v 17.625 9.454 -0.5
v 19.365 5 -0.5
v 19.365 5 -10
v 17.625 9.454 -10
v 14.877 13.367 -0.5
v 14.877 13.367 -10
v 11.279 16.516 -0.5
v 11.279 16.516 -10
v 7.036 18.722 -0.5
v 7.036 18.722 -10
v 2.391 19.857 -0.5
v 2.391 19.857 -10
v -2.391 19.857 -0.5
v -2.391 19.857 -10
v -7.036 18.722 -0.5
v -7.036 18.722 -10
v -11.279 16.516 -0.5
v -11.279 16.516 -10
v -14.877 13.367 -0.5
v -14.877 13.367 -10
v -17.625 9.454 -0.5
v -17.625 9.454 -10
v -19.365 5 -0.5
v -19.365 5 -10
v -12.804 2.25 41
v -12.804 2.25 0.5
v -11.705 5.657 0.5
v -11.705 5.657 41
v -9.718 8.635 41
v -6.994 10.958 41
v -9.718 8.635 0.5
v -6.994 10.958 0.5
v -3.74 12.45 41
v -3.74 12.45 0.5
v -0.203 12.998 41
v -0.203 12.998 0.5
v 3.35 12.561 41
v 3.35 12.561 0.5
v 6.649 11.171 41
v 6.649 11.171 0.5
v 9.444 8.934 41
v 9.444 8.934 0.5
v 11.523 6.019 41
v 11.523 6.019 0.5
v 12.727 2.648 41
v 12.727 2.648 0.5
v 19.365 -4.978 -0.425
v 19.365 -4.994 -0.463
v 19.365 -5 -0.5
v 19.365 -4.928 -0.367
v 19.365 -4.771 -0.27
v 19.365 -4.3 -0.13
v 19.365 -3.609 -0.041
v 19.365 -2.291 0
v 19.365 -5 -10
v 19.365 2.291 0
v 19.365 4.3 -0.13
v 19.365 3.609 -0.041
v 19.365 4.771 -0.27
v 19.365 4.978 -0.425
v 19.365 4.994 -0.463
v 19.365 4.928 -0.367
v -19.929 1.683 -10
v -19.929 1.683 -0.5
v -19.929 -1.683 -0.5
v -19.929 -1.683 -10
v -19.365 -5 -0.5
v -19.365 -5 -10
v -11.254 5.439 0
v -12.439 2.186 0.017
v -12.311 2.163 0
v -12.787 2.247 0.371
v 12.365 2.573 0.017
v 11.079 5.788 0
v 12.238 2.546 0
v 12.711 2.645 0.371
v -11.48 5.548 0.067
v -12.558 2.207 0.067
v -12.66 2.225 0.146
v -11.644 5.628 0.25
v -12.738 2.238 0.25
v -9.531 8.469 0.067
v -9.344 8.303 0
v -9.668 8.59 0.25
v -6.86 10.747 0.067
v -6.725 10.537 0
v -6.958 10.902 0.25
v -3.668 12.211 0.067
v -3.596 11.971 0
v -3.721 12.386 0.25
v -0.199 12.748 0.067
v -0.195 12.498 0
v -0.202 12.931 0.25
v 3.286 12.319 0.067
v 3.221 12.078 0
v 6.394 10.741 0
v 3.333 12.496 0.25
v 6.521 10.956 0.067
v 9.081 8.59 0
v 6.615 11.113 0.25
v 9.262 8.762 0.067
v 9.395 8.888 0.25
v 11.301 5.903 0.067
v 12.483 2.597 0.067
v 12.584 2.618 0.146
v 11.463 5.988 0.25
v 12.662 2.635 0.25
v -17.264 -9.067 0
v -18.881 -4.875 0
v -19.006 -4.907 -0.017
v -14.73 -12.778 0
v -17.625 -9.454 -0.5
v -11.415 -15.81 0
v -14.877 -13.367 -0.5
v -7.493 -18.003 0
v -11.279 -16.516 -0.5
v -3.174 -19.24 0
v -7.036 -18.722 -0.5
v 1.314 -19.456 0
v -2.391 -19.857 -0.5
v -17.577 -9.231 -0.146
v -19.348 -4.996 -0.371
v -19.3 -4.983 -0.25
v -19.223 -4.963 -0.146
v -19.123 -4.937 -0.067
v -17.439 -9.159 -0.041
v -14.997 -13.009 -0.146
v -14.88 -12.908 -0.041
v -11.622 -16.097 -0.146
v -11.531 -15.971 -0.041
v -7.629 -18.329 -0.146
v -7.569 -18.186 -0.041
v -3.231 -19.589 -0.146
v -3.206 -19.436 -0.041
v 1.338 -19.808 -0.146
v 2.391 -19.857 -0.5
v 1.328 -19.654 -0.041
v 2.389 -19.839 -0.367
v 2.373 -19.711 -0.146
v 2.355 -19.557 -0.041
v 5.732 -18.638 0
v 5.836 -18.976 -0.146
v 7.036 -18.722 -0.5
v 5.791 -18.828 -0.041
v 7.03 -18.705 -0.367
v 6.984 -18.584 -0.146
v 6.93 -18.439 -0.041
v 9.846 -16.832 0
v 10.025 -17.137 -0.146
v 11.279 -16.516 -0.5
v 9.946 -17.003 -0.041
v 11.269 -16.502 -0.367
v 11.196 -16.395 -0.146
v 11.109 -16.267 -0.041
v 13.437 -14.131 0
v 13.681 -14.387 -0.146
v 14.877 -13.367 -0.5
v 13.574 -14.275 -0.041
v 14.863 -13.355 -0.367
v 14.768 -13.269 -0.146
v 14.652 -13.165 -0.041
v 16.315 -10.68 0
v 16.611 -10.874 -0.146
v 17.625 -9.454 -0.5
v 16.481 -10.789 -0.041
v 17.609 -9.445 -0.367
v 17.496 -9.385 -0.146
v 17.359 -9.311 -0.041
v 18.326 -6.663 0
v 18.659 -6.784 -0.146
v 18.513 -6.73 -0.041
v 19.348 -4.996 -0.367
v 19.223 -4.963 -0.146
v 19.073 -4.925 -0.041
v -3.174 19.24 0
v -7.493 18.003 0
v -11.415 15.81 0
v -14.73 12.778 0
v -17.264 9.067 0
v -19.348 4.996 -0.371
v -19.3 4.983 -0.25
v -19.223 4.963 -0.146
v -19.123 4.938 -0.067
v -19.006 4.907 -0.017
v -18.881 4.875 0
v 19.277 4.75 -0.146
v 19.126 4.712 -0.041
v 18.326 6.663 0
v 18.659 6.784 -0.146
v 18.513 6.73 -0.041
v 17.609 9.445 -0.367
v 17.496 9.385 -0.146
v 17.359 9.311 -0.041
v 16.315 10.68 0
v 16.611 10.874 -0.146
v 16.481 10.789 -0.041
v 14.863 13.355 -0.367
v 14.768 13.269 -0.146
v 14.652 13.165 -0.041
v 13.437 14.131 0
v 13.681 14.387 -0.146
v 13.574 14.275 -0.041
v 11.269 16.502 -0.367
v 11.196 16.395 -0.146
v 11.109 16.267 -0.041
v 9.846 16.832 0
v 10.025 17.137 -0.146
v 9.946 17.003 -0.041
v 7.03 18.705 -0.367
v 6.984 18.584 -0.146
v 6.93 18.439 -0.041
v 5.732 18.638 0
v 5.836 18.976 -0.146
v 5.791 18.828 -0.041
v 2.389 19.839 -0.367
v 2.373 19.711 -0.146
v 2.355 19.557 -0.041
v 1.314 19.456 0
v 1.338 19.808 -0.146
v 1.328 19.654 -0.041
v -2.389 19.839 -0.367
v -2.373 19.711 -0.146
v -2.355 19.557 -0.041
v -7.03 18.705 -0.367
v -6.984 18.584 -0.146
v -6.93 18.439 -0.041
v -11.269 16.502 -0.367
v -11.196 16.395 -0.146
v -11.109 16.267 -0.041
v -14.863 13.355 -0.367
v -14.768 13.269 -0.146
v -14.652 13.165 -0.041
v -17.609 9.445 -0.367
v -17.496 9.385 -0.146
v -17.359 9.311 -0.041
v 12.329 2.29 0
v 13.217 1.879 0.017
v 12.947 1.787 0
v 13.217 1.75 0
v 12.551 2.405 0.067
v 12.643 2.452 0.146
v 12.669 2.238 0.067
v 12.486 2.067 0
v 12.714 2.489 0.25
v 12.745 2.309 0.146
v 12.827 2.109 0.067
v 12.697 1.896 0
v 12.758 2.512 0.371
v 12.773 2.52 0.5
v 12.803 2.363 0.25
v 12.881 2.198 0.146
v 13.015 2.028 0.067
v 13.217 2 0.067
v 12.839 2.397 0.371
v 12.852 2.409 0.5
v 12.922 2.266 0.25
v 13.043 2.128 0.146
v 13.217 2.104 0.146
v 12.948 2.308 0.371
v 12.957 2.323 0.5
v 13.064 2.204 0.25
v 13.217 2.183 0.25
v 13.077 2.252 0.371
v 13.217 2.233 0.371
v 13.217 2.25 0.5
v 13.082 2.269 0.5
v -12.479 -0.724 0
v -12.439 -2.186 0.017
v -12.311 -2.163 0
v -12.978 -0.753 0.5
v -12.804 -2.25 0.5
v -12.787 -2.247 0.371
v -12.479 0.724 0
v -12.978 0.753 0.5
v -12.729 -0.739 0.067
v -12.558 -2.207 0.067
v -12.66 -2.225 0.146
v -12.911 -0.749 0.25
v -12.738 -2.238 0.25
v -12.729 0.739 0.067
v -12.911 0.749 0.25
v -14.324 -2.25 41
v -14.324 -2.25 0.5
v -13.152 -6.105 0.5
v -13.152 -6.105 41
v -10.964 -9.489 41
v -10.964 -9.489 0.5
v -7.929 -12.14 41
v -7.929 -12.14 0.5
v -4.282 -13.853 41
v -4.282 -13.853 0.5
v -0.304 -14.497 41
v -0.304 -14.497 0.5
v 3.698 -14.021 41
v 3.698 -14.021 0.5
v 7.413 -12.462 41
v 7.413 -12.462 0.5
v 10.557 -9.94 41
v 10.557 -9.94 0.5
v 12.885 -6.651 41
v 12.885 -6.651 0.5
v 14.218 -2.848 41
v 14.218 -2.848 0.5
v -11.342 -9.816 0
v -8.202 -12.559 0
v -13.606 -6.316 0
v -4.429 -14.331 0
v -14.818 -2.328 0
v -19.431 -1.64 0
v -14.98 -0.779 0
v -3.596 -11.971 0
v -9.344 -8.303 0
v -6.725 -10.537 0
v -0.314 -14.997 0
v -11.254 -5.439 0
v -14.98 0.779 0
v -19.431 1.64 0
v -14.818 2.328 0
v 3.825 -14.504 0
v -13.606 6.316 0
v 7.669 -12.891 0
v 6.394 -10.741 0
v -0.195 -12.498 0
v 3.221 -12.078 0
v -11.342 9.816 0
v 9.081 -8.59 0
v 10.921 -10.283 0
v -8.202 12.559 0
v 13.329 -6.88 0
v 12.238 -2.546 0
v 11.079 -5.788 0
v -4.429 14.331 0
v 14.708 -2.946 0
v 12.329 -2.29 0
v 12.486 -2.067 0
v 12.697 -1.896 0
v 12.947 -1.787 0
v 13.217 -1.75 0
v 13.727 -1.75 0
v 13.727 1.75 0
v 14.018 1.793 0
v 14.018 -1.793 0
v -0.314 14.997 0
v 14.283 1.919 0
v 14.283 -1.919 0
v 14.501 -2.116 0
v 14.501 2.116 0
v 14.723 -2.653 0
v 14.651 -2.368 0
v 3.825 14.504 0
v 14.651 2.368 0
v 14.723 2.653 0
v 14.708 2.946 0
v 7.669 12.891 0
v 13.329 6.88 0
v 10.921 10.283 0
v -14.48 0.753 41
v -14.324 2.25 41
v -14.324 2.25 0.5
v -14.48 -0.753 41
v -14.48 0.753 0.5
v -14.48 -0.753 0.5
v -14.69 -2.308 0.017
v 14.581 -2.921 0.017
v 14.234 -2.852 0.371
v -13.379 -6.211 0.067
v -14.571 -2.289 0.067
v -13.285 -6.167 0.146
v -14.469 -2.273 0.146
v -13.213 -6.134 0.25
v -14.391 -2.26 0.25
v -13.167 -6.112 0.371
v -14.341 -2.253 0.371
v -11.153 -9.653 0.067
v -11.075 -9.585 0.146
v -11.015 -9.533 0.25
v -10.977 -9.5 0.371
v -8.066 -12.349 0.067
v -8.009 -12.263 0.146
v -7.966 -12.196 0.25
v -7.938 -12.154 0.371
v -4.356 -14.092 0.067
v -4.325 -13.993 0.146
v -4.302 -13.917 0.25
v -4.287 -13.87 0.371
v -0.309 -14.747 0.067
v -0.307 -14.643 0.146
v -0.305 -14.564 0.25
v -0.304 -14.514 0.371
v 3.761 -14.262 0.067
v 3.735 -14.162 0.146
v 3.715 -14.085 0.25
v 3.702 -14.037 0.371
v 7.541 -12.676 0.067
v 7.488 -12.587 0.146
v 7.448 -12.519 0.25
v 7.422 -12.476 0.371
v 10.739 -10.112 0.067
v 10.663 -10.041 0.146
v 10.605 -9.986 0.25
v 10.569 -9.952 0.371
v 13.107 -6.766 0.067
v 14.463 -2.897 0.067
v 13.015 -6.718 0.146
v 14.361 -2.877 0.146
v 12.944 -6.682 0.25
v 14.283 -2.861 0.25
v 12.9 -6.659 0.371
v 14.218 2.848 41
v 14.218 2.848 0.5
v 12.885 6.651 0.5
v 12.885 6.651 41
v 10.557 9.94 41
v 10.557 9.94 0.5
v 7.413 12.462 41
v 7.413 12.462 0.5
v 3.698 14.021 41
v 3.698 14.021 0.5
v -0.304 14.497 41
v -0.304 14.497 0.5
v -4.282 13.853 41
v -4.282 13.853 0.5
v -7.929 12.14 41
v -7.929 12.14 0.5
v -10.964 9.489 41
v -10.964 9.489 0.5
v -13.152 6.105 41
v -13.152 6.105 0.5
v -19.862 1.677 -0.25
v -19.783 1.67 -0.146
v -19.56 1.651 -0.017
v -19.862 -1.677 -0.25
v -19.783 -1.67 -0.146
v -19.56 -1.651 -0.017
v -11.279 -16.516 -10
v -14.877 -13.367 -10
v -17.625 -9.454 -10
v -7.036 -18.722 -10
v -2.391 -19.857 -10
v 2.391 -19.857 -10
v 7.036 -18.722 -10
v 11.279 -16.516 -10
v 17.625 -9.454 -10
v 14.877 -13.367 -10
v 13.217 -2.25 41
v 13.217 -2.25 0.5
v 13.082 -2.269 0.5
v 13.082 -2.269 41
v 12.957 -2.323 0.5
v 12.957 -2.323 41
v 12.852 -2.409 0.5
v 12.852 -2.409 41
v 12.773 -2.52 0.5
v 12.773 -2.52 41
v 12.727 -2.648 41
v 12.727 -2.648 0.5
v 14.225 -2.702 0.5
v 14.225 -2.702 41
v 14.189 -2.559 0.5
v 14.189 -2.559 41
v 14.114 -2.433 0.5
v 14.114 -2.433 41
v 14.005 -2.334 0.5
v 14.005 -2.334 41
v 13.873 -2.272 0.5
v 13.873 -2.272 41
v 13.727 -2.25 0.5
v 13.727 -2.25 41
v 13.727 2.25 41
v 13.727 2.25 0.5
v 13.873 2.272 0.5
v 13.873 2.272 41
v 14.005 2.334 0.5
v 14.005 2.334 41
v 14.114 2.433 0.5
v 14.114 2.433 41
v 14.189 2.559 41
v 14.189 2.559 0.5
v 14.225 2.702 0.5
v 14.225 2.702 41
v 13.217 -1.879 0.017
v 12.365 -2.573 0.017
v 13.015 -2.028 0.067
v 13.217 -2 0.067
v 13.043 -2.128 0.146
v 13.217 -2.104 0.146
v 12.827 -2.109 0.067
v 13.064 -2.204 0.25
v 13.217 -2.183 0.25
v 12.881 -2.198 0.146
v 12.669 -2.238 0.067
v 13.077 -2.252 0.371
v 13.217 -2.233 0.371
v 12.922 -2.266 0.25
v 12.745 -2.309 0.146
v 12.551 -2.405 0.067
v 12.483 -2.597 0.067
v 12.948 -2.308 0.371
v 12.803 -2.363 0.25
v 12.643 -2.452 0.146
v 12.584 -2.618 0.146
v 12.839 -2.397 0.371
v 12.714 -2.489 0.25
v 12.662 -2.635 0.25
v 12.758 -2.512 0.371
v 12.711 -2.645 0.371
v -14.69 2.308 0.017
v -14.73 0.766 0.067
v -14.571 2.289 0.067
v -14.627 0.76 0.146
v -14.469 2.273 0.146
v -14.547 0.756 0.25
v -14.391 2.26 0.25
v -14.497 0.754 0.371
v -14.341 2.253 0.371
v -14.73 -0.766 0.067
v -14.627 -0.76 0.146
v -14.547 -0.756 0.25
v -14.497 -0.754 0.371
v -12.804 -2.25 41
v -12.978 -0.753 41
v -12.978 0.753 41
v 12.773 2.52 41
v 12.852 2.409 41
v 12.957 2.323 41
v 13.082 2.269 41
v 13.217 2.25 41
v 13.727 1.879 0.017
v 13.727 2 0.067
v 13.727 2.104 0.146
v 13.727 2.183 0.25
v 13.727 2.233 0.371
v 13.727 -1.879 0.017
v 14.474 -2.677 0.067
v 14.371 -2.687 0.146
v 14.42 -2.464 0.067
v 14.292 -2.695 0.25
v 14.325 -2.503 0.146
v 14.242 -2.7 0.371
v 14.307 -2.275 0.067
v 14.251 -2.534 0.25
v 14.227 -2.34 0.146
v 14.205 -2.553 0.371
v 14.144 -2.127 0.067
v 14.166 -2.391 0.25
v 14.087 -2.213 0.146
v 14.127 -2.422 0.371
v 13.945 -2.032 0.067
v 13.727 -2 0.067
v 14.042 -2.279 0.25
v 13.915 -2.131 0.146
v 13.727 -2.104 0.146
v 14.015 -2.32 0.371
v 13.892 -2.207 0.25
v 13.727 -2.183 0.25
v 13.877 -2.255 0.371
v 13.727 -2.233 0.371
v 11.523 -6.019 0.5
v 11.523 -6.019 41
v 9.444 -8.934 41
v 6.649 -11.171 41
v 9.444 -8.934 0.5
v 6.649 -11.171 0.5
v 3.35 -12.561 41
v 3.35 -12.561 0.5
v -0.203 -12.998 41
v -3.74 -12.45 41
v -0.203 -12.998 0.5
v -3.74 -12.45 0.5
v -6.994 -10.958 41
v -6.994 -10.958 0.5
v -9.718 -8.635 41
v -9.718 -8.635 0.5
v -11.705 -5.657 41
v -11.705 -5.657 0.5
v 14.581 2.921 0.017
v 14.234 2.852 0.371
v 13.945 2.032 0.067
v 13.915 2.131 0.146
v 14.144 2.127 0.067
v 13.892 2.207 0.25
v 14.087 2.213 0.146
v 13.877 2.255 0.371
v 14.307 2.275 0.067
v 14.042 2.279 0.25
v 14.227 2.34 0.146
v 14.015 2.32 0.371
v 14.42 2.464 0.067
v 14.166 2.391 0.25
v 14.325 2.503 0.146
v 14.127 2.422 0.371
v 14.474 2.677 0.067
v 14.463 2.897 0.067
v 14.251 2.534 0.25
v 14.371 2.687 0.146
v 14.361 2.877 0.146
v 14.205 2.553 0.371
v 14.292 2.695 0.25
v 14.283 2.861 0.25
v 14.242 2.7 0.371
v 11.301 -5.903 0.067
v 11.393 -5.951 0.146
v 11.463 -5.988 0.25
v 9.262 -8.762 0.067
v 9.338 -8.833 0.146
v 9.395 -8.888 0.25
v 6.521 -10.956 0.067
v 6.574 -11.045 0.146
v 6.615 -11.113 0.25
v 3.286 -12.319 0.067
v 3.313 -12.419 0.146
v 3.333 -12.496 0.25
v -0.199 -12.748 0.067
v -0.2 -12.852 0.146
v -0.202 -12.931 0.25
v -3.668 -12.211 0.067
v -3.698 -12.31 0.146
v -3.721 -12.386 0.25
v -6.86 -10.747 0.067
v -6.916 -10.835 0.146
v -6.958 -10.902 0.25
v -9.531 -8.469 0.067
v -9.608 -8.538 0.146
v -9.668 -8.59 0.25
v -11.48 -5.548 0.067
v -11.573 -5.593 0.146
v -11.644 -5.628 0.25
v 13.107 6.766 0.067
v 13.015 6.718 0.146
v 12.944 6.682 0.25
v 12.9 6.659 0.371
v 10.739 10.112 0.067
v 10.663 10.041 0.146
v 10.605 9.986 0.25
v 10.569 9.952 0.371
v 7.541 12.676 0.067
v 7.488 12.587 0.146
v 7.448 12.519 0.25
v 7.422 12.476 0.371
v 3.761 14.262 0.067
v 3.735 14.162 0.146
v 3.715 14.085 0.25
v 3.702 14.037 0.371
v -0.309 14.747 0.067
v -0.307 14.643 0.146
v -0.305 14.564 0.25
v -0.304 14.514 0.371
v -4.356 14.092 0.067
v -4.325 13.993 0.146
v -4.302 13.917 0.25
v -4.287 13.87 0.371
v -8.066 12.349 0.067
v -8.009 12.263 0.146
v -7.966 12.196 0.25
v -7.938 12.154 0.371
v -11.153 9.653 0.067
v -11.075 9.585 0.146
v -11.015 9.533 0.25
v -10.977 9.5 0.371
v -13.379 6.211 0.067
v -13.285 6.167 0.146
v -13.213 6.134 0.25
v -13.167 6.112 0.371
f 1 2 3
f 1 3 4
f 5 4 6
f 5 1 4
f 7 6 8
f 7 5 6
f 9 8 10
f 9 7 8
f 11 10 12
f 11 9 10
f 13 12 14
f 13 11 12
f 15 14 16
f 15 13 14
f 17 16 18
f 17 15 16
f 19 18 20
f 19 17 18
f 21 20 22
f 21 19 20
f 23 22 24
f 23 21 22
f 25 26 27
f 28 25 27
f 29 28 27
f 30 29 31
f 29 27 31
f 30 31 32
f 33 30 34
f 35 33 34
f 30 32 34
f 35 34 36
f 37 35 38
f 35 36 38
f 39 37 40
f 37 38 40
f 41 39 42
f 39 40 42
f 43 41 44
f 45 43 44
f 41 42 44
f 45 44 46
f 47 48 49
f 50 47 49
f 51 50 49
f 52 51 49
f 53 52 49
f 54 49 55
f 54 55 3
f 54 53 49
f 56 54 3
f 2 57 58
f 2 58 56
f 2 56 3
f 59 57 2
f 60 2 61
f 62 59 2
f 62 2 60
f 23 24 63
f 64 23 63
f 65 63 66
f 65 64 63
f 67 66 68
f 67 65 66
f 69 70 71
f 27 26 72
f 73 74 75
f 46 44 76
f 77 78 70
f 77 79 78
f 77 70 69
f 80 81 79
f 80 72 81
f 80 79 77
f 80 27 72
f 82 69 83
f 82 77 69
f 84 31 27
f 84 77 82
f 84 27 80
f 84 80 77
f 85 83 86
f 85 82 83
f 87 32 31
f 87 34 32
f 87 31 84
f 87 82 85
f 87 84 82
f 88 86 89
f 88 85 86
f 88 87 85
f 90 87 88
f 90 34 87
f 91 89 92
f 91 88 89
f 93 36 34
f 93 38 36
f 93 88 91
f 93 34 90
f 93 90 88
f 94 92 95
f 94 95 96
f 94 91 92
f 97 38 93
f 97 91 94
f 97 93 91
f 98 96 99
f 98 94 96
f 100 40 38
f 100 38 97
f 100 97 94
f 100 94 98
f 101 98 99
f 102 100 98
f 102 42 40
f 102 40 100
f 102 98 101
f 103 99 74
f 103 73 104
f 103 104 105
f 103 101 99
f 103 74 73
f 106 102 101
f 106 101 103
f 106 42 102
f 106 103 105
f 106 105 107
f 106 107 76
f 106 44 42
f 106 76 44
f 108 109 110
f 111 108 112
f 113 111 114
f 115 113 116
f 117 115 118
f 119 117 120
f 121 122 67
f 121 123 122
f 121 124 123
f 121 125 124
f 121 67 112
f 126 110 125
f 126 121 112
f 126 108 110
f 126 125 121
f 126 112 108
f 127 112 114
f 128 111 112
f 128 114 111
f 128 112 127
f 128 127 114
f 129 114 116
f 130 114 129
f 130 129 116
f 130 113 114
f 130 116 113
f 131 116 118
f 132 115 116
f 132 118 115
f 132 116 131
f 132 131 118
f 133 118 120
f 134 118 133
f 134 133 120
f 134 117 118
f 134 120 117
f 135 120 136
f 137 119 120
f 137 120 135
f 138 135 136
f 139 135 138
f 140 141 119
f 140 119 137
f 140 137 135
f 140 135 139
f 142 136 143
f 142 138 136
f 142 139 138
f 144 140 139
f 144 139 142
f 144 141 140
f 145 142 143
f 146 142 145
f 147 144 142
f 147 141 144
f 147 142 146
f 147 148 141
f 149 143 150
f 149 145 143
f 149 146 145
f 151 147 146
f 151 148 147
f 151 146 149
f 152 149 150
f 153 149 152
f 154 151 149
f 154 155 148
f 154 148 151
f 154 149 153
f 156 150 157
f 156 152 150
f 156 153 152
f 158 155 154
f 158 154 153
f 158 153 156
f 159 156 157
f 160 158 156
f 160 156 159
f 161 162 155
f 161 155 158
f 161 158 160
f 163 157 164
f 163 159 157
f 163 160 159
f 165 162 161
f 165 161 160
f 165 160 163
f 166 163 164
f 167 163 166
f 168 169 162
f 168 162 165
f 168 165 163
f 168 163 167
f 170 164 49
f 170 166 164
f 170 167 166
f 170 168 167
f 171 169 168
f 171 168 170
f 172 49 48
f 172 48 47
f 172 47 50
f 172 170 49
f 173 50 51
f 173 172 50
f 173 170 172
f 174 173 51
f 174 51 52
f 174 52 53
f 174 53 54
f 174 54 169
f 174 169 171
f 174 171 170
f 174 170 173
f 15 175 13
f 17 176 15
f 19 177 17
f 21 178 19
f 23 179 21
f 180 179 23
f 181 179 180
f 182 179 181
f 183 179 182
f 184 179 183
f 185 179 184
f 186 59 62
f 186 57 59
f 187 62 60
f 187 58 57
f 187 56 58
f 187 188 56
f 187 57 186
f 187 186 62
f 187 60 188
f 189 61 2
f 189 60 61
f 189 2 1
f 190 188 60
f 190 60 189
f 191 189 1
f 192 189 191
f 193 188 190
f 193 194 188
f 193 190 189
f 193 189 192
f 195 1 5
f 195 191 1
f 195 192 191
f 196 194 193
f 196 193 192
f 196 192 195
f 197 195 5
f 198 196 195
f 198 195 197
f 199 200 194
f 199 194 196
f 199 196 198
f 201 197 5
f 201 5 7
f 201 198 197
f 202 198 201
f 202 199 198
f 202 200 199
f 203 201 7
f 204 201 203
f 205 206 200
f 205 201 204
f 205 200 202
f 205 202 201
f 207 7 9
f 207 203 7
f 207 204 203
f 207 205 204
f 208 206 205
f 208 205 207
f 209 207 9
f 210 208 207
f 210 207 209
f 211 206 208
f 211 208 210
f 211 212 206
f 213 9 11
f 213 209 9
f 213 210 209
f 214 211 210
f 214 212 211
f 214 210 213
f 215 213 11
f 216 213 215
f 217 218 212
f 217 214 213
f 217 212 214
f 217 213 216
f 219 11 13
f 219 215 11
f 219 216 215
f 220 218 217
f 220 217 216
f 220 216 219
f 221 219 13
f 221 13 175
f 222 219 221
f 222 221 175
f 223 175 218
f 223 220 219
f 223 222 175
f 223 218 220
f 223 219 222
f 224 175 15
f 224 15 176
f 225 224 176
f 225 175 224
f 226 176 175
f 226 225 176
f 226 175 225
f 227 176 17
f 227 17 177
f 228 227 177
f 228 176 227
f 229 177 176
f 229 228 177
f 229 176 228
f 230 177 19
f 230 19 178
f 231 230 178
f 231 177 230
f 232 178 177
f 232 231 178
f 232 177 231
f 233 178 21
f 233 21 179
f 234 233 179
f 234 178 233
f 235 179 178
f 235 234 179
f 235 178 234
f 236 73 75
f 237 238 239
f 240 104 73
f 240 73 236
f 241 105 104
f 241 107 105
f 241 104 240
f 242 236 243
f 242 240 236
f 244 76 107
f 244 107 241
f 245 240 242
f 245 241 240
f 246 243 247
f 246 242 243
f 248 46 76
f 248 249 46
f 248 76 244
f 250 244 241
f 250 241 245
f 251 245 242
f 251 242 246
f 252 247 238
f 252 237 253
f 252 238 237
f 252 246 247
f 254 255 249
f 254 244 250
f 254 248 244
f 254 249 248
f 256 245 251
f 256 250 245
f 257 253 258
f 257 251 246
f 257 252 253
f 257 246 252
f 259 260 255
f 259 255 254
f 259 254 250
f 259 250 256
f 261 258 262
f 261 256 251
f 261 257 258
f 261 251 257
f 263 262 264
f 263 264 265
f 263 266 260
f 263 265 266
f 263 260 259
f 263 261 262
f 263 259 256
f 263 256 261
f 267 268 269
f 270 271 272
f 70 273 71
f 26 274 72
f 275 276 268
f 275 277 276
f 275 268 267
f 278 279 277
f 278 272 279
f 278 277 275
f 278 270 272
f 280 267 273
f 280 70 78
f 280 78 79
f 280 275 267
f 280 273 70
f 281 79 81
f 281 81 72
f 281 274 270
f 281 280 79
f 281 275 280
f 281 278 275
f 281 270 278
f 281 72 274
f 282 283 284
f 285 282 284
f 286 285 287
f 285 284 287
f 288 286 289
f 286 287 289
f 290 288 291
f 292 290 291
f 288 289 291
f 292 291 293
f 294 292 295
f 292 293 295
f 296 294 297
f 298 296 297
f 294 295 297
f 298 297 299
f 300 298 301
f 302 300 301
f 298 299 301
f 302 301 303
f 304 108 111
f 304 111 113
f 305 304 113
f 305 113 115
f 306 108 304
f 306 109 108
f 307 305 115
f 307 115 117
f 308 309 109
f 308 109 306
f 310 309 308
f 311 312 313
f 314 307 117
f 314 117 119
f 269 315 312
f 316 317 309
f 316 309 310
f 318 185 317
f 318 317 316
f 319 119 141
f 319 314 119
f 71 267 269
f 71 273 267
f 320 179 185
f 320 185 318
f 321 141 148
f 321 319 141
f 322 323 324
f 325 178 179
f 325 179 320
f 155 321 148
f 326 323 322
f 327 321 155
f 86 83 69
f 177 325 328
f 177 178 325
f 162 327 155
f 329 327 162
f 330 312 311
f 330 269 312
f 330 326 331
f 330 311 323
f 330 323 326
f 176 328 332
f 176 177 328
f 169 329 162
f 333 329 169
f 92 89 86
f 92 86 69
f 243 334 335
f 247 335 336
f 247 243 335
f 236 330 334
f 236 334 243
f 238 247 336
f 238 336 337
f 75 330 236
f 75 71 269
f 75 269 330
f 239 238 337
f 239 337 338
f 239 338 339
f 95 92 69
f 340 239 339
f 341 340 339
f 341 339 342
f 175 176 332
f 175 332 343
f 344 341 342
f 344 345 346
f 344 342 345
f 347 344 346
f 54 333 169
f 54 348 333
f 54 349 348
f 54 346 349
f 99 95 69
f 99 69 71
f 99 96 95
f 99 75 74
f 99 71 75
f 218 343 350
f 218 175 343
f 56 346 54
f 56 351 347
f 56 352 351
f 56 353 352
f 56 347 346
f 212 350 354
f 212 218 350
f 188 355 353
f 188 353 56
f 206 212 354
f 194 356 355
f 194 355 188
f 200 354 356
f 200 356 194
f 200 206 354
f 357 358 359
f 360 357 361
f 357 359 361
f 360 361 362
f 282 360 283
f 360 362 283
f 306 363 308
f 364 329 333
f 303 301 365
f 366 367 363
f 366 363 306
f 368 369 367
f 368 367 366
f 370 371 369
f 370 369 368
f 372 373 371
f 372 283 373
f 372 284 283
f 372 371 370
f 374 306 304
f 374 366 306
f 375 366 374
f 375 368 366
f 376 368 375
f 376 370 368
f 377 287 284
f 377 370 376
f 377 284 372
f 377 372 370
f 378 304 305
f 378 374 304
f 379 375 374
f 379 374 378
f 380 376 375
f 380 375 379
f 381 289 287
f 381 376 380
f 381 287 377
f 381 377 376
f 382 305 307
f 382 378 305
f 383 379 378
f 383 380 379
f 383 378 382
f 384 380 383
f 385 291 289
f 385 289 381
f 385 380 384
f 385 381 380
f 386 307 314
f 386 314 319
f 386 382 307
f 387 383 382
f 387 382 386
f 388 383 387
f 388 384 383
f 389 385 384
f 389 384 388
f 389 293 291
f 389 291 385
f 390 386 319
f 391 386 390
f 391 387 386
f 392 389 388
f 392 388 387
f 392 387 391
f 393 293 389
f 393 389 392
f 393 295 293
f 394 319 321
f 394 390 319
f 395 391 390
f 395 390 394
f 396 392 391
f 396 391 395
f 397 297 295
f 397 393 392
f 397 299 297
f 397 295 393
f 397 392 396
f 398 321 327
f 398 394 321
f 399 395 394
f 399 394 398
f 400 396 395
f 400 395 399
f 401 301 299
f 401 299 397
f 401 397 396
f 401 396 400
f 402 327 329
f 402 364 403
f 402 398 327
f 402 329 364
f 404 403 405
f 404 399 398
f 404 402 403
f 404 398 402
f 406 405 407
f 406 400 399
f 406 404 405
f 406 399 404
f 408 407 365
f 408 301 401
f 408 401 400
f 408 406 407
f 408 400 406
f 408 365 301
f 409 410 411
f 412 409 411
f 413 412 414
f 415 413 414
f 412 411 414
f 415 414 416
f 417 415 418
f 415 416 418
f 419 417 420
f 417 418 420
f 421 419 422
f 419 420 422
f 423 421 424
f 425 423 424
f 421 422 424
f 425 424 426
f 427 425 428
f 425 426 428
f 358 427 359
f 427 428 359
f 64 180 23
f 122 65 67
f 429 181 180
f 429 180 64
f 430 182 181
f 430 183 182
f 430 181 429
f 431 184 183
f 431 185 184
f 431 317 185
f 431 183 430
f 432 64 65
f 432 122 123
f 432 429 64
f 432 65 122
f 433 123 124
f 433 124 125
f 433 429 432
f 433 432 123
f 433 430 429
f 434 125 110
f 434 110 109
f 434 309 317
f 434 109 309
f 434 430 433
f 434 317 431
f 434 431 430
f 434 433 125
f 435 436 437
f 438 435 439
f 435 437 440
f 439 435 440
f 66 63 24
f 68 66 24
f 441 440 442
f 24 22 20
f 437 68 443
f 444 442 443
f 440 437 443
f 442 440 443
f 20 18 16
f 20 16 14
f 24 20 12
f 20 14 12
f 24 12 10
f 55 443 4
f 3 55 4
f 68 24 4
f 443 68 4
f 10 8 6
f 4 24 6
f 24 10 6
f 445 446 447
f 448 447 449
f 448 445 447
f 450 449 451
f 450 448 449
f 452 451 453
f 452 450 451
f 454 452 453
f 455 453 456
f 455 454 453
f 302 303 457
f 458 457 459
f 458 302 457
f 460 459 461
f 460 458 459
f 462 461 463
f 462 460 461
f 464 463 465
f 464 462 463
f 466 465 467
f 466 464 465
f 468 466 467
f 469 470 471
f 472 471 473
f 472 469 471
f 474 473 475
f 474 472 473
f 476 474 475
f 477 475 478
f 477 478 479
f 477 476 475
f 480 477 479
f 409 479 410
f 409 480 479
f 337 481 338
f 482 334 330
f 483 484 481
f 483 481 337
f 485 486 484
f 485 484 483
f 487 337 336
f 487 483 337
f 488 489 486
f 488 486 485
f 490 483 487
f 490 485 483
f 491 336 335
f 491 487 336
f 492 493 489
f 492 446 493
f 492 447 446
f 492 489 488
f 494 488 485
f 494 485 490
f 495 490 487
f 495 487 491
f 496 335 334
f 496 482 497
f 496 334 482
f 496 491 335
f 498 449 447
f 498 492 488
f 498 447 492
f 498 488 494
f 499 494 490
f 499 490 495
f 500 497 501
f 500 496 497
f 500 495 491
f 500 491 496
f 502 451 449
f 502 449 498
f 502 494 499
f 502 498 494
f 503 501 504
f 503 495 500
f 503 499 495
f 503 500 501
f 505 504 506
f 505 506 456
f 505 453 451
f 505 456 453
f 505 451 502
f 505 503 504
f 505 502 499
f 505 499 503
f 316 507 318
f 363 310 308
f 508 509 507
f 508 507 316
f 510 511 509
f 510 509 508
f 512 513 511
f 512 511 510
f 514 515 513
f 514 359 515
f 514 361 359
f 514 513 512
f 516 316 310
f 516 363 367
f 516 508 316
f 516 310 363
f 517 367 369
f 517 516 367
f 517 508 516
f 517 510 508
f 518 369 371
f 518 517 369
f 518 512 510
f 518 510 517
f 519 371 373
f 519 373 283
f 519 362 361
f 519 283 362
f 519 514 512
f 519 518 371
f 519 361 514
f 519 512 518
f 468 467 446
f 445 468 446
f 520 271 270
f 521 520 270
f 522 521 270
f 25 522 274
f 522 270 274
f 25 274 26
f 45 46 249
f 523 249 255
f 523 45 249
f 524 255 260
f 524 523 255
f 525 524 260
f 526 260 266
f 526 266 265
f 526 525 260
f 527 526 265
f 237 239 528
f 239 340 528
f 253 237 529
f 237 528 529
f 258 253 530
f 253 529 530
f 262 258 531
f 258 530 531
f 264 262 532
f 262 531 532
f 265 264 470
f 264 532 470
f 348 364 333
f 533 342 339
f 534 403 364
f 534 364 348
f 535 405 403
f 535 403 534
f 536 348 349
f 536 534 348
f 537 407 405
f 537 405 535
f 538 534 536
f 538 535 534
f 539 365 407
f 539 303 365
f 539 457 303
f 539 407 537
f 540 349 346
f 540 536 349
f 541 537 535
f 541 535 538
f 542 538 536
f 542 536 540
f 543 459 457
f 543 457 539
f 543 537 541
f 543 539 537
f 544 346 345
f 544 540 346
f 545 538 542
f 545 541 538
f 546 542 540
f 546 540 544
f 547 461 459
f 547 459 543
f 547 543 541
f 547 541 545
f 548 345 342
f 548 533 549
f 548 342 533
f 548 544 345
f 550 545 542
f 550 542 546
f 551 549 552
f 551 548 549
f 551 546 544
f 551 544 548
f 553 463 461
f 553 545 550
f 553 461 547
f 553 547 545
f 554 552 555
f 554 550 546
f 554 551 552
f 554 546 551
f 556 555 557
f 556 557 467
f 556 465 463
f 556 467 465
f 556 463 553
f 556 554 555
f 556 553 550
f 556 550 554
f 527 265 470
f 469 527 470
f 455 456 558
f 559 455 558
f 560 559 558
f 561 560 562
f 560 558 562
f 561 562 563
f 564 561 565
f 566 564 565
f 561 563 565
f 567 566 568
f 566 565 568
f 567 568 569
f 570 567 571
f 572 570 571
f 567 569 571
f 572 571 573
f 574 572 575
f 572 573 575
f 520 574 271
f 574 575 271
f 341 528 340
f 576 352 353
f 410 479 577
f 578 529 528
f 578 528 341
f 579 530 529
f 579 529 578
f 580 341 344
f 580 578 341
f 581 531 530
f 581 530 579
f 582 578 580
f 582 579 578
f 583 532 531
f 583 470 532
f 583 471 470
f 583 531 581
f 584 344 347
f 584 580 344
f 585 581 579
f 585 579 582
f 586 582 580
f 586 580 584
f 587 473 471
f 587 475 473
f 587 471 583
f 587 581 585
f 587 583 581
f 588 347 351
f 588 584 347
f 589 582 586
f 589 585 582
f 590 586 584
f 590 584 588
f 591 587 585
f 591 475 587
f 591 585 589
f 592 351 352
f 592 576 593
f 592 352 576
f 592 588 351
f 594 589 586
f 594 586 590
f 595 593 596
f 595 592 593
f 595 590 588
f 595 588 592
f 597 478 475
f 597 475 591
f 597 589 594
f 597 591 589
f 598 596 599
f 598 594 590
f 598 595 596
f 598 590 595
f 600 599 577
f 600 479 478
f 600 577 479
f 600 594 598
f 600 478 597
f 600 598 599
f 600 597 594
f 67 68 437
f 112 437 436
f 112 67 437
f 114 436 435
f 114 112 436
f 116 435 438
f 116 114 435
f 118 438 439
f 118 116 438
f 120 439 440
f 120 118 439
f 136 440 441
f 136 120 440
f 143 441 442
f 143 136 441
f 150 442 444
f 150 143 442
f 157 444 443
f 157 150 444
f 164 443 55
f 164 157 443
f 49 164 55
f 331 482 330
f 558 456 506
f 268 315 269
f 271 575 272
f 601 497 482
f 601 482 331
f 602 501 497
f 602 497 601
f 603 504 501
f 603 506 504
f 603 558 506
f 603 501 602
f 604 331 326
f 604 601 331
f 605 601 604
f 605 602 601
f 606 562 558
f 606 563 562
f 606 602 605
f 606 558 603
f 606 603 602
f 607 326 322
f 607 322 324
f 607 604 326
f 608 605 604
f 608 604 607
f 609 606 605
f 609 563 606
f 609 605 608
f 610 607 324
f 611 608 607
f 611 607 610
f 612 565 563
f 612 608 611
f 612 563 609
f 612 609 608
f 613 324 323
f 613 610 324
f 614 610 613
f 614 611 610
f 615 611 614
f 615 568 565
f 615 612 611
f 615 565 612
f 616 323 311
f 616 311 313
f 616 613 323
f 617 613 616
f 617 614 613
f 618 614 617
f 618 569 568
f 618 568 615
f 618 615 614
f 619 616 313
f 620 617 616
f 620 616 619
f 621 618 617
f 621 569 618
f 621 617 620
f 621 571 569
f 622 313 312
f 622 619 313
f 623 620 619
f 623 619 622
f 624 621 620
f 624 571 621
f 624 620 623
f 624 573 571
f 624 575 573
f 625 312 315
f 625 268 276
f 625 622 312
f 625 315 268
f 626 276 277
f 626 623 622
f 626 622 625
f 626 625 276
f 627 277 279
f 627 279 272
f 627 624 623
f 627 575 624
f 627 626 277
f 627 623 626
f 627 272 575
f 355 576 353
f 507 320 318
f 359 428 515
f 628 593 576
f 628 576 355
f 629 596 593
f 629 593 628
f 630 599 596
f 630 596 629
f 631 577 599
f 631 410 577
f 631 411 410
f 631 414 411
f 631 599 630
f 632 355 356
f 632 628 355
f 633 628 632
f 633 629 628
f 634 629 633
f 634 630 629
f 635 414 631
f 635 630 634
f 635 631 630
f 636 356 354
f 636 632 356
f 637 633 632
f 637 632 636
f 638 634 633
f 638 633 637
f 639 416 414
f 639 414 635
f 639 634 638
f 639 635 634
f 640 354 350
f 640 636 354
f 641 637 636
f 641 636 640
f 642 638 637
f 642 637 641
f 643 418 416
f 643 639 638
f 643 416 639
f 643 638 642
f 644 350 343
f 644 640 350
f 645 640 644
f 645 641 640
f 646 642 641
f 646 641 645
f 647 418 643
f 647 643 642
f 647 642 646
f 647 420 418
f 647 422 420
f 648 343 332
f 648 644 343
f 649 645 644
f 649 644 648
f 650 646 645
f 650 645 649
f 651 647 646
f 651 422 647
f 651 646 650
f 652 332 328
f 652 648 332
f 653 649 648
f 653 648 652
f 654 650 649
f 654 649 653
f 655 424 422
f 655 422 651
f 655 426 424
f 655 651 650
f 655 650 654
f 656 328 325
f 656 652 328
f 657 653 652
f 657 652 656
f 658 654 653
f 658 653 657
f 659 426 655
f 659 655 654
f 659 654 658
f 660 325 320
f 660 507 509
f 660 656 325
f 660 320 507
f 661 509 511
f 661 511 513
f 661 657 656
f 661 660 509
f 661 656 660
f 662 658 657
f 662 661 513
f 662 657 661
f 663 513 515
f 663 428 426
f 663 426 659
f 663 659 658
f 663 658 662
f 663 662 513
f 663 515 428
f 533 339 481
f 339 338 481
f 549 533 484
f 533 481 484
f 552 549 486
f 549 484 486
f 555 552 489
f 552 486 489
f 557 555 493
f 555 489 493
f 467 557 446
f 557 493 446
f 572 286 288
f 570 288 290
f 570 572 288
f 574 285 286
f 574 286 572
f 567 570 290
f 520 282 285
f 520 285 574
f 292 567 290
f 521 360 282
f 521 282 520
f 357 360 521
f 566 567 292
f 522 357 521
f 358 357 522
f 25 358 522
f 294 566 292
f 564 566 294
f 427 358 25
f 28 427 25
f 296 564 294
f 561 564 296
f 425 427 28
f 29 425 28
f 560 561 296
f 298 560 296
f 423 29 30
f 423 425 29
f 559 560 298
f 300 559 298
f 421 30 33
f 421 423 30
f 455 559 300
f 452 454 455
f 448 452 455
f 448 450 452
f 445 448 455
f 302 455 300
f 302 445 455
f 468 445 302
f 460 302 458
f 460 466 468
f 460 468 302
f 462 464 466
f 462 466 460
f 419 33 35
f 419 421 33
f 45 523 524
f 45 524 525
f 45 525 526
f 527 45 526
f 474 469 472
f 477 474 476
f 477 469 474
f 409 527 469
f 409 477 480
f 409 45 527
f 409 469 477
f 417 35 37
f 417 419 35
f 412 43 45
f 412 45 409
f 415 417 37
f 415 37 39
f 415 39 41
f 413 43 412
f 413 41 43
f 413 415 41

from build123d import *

# Parameters (mm, degrees)
F0_W     = 38.7298334621
F0_H     = 10
F1_DEPTH = 10
F3_DEPTH = 41
F4_F1_R  = 0.5
F4_F2_R  = 0.5


with BuildPart() as f1:
    # F0 (on Top) → F1 (new body)
    with BuildSketch(Plane.XY):
        with BuildLine():
            Line((-19.364916731, 5), (19.364916731, 5))
            ThreePointArc((19.364916731, 5), (0, 20), (-19.364916731, 5))
        make_face()
        Rectangle(F0_W, F0_H)
        with BuildLine():
            ThreePointArc((-19.364916731, -5), (0, -20), (19.364916731, -5))
            Line((19.364916731, -5), (-19.364916731, -5))
        make_face()
        with BuildLine():
            Line((-19.364916731, -5), (-19.364916731, 5))
            ThreePointArc((-19.364916731, 5), (-20, 0), (-19.364916731, -5))
        make_face()
    extrude(amount=-F1_DEPTH)

    # F2 (on face) → F3 (join)
    with BuildSketch(Plane.XY):
        with BuildLine():
            ThreePointArc((-12.8038080273, 2.25), (0, 13), (12.8038080273, 2.25))
            Line((12.8038080273, 2.25), (14.3243673508, 2.25))
            ThreePointArc((14.3243673508, 2.25), (0, 14.5), (-14.3243673508, 2.25))
            Line((-14.3243673508, 2.25), (-12.8038080273, 2.25))
        make_face()
        with BuildLine():
            Line((14.3243673508, -2.25), (12.8038080273, -2.25))
            ThreePointArc((12.8038080273, -2.25), (0, -13), (-12.8038080273, -2.25))
            Line((-12.8038080273, -2.25), (-14.3243673508, -2.25))
            ThreePointArc((-14.3243673508, -2.25), (0, -14.5), (14.3243673508, -2.25))
        make_face()
        with BuildLine():
            ThreePointArc((-12.8038080273, -2.25), (-13, 0), (-12.8038080273, 2.25))
            Line((-12.8038080273, 2.25), (-14.3243673508, 2.25))
            ThreePointArc((-14.3243673508, 2.25), (-14.5, 0), (-14.3243673508, -2.25))
            Line((-14.3243673508, -2.25), (-12.8038080273, -2.25))
        make_face()
    extrude(amount=F3_DEPTH)

    # F4: fillet of radius 0.5 on 7 edges, made by hand

    # F4_f1
    f4_f1_edges = [f1.edges().sort_by_distance(p)[0] for p in [
        (-20, 0, 0),
        (12.8038080273, 2.25, 20.5),
        (12.8038080273, -2.25, 20.5),
        (14.3243673508, 2.25, 20.5),
        (14.3243673508, -2.25, 20.5),
    ]]
    fillet(f4_f1_edges, radius=F4_F1_R)

    # F4_f2
    f4_f2_edges = [f1.edges().sort_by_distance(p)[0] for p in [
        (-14.5, 0, 0),
        (-13, 0, 0),
        (12.9014449798, -2.3621044432, 0),
        (12.9014449798, 2.3621044432, 0),
        (14.1139754816, 2.4330671545, 0),
        (14.1139754816, -2.4330671545, 0),
    ]]
    fillet(f4_f2_edges, radius=F4_F2_R)


solid = f1.part
